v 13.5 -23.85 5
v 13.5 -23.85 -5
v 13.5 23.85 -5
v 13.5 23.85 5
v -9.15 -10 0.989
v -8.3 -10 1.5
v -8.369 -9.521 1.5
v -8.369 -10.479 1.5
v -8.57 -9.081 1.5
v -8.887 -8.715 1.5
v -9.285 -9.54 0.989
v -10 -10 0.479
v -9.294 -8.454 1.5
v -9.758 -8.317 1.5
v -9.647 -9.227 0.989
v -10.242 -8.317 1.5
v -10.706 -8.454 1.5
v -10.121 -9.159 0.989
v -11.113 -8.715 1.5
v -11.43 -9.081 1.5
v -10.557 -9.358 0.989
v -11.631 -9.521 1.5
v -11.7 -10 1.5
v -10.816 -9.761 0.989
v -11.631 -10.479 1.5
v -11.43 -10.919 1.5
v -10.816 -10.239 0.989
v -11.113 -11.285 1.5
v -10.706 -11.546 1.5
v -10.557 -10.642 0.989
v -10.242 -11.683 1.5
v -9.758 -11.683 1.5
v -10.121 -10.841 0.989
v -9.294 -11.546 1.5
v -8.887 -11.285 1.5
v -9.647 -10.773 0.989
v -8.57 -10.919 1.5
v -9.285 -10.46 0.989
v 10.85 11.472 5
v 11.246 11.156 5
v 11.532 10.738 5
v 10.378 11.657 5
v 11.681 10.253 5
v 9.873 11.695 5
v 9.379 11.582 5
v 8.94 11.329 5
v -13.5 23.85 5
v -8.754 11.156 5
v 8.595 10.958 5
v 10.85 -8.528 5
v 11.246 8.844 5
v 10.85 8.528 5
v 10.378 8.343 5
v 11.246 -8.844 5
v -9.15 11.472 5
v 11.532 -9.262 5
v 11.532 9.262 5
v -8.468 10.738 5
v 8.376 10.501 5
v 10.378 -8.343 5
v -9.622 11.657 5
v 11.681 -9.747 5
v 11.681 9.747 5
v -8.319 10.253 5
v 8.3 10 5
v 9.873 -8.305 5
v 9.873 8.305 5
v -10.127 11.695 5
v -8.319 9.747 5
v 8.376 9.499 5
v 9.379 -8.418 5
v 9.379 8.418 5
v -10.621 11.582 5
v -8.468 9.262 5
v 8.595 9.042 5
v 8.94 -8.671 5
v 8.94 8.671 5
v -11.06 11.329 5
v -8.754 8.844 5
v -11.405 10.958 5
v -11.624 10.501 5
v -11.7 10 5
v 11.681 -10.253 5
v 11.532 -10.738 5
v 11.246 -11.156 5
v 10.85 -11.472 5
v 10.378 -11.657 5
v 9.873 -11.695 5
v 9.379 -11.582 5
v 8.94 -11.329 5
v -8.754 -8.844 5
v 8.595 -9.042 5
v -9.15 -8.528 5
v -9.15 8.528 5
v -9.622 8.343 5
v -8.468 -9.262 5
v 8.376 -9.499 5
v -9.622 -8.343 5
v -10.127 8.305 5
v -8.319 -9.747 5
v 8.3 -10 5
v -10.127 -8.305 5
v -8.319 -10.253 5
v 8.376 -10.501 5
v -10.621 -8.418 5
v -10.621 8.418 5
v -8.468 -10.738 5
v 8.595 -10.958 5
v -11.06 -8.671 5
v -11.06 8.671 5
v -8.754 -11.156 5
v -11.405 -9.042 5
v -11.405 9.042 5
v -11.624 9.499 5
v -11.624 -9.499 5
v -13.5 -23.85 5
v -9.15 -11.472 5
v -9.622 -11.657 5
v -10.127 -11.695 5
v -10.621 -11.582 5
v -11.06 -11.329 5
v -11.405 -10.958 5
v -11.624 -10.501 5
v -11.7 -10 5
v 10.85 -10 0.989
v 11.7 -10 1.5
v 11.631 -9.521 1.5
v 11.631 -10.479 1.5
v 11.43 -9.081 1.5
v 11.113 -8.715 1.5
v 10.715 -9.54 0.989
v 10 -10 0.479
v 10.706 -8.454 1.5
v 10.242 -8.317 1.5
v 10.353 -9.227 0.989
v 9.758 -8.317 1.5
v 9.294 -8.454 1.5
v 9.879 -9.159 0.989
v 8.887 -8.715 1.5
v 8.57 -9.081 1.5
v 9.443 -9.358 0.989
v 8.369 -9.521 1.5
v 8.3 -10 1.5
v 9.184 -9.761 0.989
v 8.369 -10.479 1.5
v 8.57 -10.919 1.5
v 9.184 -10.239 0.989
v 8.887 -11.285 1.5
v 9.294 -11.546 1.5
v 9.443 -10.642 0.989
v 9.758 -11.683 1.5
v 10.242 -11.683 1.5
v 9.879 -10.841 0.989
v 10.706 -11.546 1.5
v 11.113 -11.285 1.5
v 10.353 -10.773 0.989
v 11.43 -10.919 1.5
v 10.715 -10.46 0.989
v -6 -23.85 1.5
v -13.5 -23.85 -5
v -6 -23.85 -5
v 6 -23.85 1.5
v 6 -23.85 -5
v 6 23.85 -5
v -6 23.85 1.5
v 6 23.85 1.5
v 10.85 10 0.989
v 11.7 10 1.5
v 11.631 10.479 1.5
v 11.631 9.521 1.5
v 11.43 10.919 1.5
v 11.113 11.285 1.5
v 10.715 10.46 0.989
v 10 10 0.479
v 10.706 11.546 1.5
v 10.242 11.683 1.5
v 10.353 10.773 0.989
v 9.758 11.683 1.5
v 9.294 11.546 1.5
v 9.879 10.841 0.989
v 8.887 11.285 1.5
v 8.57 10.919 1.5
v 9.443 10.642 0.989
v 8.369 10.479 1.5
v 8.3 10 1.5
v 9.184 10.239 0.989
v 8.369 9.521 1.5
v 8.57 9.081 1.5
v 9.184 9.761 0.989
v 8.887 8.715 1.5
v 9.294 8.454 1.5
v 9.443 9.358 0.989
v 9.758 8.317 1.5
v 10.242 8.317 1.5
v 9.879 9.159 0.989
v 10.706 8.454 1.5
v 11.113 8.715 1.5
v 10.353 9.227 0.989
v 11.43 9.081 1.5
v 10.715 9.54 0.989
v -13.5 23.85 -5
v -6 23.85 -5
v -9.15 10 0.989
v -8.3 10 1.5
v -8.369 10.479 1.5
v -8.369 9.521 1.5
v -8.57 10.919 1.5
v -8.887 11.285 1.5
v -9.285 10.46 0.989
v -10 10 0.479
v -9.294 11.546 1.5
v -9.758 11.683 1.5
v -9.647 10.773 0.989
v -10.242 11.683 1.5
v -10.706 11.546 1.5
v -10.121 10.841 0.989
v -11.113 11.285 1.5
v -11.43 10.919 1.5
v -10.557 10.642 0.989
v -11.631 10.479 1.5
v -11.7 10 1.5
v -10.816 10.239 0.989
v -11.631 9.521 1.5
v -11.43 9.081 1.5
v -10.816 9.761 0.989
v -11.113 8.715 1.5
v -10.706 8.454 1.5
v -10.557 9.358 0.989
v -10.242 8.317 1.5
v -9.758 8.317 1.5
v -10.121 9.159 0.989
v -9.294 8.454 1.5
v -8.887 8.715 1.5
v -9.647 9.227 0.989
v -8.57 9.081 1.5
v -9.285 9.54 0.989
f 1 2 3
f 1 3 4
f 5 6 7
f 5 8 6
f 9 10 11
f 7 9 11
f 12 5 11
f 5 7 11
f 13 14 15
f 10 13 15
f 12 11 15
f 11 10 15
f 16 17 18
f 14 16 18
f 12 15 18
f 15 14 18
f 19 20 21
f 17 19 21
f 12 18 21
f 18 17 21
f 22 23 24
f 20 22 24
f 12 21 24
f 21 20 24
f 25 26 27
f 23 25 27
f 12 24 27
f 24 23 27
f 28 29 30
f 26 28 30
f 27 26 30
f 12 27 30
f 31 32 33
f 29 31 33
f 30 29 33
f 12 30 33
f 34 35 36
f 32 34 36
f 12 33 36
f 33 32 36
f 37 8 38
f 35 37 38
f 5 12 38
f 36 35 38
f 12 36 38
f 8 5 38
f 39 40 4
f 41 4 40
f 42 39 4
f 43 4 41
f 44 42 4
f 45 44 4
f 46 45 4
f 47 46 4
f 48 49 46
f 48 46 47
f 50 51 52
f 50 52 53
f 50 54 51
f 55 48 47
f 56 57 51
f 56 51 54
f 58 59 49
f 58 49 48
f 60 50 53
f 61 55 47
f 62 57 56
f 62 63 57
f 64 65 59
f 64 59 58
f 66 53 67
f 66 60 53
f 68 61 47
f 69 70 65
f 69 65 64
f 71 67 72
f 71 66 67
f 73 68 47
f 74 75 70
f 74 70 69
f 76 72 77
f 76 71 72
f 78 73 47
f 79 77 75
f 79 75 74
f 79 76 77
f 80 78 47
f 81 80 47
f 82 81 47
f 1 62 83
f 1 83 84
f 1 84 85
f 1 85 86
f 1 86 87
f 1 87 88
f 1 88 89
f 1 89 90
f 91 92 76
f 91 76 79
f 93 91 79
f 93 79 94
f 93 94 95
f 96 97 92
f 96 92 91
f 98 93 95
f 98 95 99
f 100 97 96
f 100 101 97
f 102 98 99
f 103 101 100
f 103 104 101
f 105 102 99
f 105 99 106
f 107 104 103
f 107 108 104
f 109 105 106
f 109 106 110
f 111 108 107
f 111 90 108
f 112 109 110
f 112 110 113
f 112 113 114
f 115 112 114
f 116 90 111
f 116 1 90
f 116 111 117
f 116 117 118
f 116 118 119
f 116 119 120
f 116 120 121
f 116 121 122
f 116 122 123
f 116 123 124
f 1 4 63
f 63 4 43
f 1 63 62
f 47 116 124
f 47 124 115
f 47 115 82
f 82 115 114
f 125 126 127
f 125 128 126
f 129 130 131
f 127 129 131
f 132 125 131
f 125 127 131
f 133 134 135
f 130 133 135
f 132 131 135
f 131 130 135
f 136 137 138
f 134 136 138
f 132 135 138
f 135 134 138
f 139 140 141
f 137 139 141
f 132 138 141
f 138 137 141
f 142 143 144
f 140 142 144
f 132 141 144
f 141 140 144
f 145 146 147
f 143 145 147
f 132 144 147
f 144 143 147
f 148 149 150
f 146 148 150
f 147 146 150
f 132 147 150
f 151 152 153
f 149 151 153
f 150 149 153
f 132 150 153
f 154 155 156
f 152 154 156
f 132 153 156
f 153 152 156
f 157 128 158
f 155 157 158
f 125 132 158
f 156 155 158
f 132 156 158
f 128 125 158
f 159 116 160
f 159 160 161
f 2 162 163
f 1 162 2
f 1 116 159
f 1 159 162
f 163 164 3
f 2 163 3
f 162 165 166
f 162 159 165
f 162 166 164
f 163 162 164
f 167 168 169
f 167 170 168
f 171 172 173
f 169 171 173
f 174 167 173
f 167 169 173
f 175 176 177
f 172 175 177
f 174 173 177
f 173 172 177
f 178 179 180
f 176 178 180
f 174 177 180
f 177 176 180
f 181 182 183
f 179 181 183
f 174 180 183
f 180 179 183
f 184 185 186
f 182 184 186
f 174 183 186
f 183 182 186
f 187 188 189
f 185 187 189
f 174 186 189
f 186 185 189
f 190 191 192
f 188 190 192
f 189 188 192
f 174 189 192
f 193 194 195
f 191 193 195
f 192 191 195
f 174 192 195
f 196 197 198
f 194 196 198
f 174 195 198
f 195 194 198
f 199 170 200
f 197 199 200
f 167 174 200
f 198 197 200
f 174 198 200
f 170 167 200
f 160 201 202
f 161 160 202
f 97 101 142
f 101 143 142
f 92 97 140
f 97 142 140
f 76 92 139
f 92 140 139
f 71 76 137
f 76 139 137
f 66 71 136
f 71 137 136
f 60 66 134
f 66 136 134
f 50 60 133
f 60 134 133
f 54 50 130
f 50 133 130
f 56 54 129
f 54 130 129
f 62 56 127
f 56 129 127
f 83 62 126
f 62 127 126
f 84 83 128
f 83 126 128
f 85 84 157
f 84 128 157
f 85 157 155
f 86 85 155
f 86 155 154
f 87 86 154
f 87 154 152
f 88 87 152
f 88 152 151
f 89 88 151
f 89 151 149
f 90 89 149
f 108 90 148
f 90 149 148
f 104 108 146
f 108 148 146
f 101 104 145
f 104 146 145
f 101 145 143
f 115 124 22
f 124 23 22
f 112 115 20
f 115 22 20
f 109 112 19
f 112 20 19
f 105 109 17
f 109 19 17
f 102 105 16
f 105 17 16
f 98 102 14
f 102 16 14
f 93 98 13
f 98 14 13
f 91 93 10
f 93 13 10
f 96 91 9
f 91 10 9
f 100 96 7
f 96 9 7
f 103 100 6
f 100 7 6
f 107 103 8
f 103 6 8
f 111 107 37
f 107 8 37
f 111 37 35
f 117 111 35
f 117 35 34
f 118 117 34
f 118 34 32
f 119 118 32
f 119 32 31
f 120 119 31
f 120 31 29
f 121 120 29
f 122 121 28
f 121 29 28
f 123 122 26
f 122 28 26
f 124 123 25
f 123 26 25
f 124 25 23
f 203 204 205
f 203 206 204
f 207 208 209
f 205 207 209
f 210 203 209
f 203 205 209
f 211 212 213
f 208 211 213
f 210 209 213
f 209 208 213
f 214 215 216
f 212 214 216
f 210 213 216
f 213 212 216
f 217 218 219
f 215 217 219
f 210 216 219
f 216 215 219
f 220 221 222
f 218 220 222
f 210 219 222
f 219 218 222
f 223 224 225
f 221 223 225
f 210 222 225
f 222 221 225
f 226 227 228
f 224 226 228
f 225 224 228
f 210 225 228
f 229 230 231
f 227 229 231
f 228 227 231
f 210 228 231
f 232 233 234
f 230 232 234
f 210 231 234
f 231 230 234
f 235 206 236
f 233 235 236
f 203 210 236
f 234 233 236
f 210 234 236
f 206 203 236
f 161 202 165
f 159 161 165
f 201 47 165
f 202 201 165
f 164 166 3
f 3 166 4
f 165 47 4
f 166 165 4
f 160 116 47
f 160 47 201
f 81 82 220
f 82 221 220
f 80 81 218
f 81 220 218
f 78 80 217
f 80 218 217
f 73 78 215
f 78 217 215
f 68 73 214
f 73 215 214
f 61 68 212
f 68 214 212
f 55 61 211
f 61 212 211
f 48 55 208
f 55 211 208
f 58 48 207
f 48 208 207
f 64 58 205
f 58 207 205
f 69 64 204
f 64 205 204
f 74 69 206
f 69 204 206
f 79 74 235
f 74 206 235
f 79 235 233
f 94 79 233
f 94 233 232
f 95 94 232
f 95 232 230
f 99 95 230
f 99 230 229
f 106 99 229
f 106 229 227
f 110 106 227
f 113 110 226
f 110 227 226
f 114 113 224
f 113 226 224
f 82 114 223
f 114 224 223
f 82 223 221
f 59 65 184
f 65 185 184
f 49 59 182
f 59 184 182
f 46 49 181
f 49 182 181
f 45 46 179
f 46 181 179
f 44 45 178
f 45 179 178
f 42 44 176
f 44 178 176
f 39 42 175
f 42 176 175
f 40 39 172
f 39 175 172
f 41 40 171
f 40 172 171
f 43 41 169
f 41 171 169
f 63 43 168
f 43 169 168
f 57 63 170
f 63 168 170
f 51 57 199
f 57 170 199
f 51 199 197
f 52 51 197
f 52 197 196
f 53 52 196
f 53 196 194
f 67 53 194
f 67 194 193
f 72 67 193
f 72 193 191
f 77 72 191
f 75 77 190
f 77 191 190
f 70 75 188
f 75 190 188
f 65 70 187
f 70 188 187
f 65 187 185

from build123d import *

# Parameters (mm, degrees)
F1_DEPTH = 23.85
F3_D     = 3.4
F3_DEPTH = 3.5
F3_TIP   = 1.0214630523


with BuildPart() as f1:
    # F0 (on Front) → F1 (new body, symmetric)
    with BuildSketch(Plane.XZ):
        Polygon((6, -5), (13.5, -5), (13.5, 5), (-13.5, 5), (-13.5, -5), (-6, -5), (-6, 1.5), (6, 1.5), align=None)
    extrude(amount=F1_DEPTH, both=True)

    # F3
    with Locations(Plane.XY.offset(5)):
        with Locations((10, 10), (10, -10), (-10, -10), (-10, 10)):
            Hole(F3_D / 2, depth=F3_DEPTH)
            with Locations((0, 0, -(F3_DEPTH + F3_TIP / 2))):  # 118° drill point
                Cone(0, F3_D / 2, F3_TIP, mode=Mode.SUBTRACT)


solid = f1.part
